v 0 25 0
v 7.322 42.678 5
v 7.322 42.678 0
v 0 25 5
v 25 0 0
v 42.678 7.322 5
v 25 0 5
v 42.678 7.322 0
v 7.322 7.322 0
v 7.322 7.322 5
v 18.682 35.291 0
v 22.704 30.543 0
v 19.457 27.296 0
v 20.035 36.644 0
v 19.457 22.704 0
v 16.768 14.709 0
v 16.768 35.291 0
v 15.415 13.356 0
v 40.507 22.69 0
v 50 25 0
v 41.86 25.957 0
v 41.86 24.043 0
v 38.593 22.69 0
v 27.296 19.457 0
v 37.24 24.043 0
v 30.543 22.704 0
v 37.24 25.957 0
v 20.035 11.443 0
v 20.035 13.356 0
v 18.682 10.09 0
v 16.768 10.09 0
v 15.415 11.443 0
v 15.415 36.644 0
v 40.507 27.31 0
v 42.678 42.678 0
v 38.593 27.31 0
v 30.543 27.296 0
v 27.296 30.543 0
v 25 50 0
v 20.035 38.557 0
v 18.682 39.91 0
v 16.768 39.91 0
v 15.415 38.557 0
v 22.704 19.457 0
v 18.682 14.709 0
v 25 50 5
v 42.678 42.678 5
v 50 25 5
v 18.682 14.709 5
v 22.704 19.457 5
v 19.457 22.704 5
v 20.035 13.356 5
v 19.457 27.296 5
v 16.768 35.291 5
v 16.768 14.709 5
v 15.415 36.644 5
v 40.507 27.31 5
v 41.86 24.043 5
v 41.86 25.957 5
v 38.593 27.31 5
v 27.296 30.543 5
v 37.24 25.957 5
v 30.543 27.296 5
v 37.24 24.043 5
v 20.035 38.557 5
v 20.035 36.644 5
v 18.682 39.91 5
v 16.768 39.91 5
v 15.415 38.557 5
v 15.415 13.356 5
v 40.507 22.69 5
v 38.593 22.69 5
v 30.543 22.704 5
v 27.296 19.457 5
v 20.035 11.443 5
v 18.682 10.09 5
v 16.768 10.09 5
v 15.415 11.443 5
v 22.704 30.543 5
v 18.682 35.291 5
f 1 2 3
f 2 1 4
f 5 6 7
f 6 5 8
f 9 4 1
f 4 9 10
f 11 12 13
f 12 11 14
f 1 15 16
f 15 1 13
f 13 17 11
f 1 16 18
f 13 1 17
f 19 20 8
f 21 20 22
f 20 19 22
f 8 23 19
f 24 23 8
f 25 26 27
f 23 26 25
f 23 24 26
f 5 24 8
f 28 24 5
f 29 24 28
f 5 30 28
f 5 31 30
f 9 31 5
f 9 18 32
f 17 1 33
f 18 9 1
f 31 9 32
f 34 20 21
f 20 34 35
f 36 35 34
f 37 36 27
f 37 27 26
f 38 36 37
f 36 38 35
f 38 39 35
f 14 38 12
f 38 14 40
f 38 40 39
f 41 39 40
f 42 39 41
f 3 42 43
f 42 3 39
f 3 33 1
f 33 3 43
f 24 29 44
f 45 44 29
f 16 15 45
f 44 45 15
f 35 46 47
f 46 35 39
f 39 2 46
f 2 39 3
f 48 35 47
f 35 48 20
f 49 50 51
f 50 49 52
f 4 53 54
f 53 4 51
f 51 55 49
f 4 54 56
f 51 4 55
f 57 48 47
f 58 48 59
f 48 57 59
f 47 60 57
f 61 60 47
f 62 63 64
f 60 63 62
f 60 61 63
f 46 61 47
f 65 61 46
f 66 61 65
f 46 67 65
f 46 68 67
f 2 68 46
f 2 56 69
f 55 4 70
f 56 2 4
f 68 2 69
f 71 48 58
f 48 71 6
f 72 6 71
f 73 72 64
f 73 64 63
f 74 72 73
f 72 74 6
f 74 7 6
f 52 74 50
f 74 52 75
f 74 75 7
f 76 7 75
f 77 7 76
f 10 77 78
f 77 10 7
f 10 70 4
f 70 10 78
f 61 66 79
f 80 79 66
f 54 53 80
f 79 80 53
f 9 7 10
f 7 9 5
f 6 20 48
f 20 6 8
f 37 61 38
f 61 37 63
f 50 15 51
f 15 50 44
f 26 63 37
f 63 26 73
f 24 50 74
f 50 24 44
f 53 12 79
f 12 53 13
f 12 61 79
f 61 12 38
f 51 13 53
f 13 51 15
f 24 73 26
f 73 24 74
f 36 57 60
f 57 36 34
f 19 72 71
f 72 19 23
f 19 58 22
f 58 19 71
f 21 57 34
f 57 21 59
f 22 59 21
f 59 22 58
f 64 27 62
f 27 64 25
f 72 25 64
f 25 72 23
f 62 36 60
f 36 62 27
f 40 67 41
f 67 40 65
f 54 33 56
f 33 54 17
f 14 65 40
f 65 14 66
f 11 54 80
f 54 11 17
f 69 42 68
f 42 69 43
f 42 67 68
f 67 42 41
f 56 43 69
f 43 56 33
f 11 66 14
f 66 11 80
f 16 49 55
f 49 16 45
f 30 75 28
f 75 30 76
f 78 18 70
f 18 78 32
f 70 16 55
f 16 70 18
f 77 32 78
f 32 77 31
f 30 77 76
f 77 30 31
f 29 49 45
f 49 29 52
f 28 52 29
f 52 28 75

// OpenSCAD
$fn = 32;

// ----------------------------------------------------------------------
// Polygon plate: 8-gon R25, 3 bolt windows
// ----------------------------------------------------------------------

// --- parameters (mm) ---
sides = 8;                // number of polygon sides
plate_r = 25;             // circumscribed radius of the polygon
bore_r = 6;               // centre bore radius
bolts = 3;                // number of bolt windows
ring_r = 14.55;           // bolt-circle radius
bolt_r = 2.5;             // bolt window radius
plate_t = 5;              // plate thickness, Z (extrusion height)
fit_tol = 0.1;            // declared fit tolerance (prompt contract)
free_tol = 0.5;           // declared free tolerance (prompt contract)

plate_d = 2 * plate_r;  // circumscribed diameter
bore_d = 2 * bore_r;  // centre bore diameter
bolt_d = 2 * bolt_r;  // bolt window diameter
ring_d = 2 * ring_r;  // bolt-circle diameter

profile = [[50, 25], [42.678, 42.678], [25, 50], [7.322, 42.678], [0, 25], [7.322, 7.322], [25, 0], [42.678, 7.322]];  // primary outline, 8 points, counter clockwise
void_1 = [[30.543, 27.296], [27.296, 30.543], [22.704, 30.543], [19.457, 27.296], [19.457, 22.704], [22.704, 19.457], [27.296, 19.457], [30.543, 22.704]];  // centre bore, 8 points
void_2 = [[41.86, 25.957], [40.507, 27.31], [38.593, 27.31], [37.24, 25.957], [37.24, 24.043], [38.593, 22.69], [40.507, 22.69], [41.86, 24.043]];  // bolt window 1, 8 points
void_3 = [[20.035, 38.557], [18.682, 39.91], [16.768, 39.91], [15.415, 38.557], [15.415, 36.644], [16.768, 35.291], [18.682, 35.291], [20.035, 36.644]];  // bolt window 2, 8 points
void_4 = [[20.035, 13.356], [18.682, 14.709], [16.768, 14.709], [15.415, 13.356], [15.415, 11.443], [16.768, 10.09], [18.682, 10.09], [20.035, 11.443]];  // bolt window 3, 8 points

// --- the one profile operation ---
difference() {
  linear_extrude(height = plate_t) polygon(points = profile);
  translate([0, 0, -1])
    linear_extrude(height = plate_t + 2) polygon(points = void_1);
  translate([0, 0, -1])
    linear_extrude(height = plate_t + 2) polygon(points = void_2);
  translate([0, 0, -1])
    linear_extrude(height = plate_t + 2) polygon(points = void_3);
  translate([0, 0, -1])
    linear_extrude(height = plate_t + 2) polygon(points = void_4);
}
